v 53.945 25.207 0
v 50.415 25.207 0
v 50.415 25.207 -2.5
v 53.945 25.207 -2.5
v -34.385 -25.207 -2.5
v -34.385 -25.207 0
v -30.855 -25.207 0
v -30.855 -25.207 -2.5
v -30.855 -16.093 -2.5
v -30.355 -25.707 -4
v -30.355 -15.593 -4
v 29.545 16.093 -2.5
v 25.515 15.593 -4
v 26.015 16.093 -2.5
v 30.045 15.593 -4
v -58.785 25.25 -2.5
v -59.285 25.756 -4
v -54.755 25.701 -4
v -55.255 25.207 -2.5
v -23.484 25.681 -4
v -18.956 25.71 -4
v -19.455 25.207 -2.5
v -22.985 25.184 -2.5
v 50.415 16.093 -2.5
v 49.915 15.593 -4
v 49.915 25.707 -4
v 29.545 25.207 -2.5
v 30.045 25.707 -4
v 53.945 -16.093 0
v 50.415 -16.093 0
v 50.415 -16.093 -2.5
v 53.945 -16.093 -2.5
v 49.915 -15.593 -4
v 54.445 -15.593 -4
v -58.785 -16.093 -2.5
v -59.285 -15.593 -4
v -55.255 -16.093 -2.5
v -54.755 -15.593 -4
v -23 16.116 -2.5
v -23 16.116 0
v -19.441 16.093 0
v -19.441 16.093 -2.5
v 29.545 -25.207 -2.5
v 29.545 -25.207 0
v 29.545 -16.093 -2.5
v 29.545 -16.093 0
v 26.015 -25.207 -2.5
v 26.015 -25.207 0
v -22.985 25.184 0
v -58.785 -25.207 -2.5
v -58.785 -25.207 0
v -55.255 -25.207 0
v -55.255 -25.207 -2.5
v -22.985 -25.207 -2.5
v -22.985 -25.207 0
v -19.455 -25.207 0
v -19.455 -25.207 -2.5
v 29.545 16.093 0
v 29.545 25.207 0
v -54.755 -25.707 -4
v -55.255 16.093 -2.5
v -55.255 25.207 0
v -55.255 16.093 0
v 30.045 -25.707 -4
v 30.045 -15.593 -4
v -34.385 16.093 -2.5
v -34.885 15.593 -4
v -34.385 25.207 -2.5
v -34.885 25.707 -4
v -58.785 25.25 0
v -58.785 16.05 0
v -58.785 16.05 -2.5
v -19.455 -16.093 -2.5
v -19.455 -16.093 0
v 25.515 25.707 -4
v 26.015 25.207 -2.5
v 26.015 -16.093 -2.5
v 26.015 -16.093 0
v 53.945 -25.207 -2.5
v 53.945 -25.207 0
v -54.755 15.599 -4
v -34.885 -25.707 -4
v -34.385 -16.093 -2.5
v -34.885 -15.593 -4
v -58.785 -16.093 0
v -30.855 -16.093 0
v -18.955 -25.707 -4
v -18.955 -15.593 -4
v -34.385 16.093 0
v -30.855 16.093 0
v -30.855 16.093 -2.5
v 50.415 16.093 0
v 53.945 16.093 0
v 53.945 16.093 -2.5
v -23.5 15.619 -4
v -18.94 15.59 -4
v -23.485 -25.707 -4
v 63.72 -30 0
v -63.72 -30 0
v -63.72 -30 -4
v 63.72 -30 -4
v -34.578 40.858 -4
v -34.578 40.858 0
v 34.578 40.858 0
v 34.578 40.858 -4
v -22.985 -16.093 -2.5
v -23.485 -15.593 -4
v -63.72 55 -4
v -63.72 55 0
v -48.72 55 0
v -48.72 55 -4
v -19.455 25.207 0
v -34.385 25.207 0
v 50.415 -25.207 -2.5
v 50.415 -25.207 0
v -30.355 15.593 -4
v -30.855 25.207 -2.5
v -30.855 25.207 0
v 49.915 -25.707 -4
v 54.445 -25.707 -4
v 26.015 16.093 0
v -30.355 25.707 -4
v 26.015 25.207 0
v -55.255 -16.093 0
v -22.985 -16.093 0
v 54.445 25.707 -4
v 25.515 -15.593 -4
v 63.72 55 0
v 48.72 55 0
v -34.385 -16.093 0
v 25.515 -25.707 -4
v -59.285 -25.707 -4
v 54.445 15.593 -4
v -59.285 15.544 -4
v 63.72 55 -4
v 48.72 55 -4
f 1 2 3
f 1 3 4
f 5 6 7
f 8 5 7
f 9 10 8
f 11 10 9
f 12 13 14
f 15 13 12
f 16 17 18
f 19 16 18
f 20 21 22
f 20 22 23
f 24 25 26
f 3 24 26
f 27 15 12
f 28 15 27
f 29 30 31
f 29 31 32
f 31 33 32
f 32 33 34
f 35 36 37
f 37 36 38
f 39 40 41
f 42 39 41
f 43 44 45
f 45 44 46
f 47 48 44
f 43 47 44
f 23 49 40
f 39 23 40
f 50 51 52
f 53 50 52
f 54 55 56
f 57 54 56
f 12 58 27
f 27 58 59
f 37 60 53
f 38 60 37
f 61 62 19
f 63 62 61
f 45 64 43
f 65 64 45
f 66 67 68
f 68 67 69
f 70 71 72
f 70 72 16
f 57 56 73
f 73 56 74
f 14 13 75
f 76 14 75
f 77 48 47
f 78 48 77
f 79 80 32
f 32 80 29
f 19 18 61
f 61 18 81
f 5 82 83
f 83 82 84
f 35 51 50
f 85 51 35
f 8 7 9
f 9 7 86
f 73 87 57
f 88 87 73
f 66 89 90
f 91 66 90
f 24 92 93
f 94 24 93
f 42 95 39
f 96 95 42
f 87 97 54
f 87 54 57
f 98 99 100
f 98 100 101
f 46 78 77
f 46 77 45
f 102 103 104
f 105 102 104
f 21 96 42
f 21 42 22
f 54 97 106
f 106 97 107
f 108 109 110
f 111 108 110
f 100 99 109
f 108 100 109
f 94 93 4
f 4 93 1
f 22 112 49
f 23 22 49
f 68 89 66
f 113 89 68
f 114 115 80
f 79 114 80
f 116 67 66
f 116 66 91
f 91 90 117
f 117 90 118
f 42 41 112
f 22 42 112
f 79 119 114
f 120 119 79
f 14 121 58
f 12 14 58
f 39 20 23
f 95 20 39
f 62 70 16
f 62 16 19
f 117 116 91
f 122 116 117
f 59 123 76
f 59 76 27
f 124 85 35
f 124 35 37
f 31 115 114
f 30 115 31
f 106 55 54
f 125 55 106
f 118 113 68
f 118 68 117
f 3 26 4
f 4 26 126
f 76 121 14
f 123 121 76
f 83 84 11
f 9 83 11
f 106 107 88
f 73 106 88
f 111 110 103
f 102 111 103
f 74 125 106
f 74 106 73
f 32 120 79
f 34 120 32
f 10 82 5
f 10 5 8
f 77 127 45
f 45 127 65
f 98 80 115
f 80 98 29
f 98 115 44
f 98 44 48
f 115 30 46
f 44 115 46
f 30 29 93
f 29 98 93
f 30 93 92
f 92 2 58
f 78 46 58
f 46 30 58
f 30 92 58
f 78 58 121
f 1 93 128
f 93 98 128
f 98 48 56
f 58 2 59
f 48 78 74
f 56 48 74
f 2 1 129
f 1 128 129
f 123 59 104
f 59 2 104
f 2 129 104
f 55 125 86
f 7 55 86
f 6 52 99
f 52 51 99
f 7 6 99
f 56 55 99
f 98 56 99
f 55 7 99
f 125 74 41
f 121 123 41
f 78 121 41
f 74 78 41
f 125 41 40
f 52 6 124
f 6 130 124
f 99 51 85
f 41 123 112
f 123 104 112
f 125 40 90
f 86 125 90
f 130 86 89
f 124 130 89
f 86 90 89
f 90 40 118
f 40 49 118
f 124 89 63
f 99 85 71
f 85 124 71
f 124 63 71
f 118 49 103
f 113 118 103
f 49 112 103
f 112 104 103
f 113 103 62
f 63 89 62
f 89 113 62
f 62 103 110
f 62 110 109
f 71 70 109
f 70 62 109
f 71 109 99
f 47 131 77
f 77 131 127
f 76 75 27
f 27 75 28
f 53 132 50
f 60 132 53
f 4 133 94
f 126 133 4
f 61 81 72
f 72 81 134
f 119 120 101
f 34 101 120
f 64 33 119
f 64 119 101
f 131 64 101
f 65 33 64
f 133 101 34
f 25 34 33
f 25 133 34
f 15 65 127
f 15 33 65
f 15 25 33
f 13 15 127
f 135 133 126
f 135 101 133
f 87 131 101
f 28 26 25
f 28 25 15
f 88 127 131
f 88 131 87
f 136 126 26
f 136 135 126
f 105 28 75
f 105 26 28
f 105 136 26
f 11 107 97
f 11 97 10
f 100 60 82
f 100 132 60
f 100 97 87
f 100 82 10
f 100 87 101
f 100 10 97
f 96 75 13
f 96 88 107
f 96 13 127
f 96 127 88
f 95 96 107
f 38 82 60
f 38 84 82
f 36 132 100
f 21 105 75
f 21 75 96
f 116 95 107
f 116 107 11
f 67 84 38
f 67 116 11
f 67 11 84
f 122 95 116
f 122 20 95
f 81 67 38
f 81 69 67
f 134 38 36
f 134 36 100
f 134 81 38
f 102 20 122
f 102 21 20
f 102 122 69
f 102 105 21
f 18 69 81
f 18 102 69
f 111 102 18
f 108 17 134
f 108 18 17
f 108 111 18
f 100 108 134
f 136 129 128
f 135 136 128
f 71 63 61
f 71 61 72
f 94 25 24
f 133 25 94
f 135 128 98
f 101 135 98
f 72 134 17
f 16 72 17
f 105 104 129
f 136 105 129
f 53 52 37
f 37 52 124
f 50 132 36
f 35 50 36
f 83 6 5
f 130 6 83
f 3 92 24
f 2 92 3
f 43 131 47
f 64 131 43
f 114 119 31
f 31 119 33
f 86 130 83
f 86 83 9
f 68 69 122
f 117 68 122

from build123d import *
from OCP.BRepFilletAPI import BRepFilletAPI_MakeChamfer

# Parameters (mm, degrees)
SKETCH1_W           = 127.440194606
SKETCH1_H           = 60
SKETCH1_W_2         = 3.53
SKETCH1_H_2         = 9.11399265
BOSS_EXTRUDE1_DEPTH = 4
BOSS_EXTRUDE2_DEPTH = 4
CHAMFER1_SIZE       = 1.5
CHAMFER1_SIZE2      = 0.5


with BuildPart() as part:
    # Sketch1 → Boss-Extrude1 (new body)
    with BuildSketch(Plane.XY):
        Rectangle(SKETCH1_W, SKETCH1_H)
        with Locations((-32.620097303, 20.65)):
            Rectangle(SKETCH1_W_2, SKETCH1_H_2, mode=Mode.SUBTRACT)
        with Locations((27.7799027, 20.65)):
            Rectangle(SKETCH1_W_2, SKETCH1_H_2, mode=Mode.SUBTRACT)
        with Locations((27.7799027, -20.65)):
            Rectangle(SKETCH1_W_2, SKETCH1_H_2, mode=Mode.SUBTRACT)
        Polygon((-19.455133439, 25.206990566), (-22.985061166, 25.184401952), (-22.999551776, 16.115598048), (-19.440642829, 16.093009434), align=None, mode=Mode.SUBTRACT)
        with Locations((-21.220097303, -20.65)):
            Rectangle(SKETCH1_W_2, SKETCH1_H_2, mode=Mode.SUBTRACT)
        with Locations((52.1799027, 20.65)):
            Rectangle(SKETCH1_W_2, SKETCH1_H_2, mode=Mode.SUBTRACT)
        with Locations((52.1799027, -20.65)):
            Rectangle(SKETCH1_W_2, SKETCH1_H_2, mode=Mode.SUBTRACT)
        with Locations((-32.620097303, -20.65)):
            Rectangle(SKETCH1_W_2, SKETCH1_H_2, mode=Mode.SUBTRACT)
        Polygon((-58.784966326, 25.25), (-55.255228279, 25.206996325), (-55.255228279, 16.093003675), (-58.784966326, 16.05), align=None, mode=Mode.SUBTRACT)
        with Locations((-57.020097303, -20.65)):
            Rectangle(SKETCH1_W_2, SKETCH1_H_2, mode=Mode.SUBTRACT)
    extrude(amount=-BOSS_EXTRUDE1_DEPTH)

    # Sketch2 → Boss-Extrude2 (add)
    with BuildSketch(Plane.XY):
        Polygon((-63.720097303, 30), (-63.720097303, 55), (-48.720097303, 55), (-34.577961679, 40.857864376), (34.577961679, 40.857864376), (48.720097303, 55), (63.720097303, 55), (63.720097303, 30), align=None)
    extrude(amount=-BOSS_EXTRUDE2_DEPTH)

    # Chamfer1: one chamfer whose edges measure the first distance from different faces: ONE call of the kernel's chamfer builder (chamfer() names one face for all edges)
    chamfer1_edges_1 = [part.edges().sort_by_distance(p)[0] for p in [
        (50.4149027, -20.65, -4),
    ]]
    chamfer1_side_1 = [part.faces().sort_by_distance(p)[0] for p in [
        (50.4149027, -20.65, -2),
    ]]
    chamfer1_edges_2 = [part.edges().sort_by_distance(p)[0] for p in [
        (52.1799027, -16.093003675, -4),
    ]]
    chamfer1_side_2 = [part.faces().sort_by_distance(p)[0] for p in [
        (52.1799027, -16.093003675, -2),
    ]]
    chamfer1_edges_3 = [part.edges().sort_by_distance(p)[0] for p in [
        (53.9449027, -20.65, -4),
    ]]
    chamfer1_side_3 = [part.faces().sort_by_distance(p)[0] for p in [
        (53.9449027, -20.65, -2),
    ]]
    chamfer1_edges_4 = [part.edges().sort_by_distance(p)[0] for p in [
        (52.1799027, -25.206996325, -4),
    ]]
    chamfer1_side_4 = [part.faces().sort_by_distance(p)[0] for p in [
        (52.1799027, -25.206996325, -2),
    ]]
    chamfer1_edges_5 = [part.edges().sort_by_distance(p)[0] for p in [
        (-58.784966326, 20.65, -4),
    ]]
    chamfer1_side_5 = [part.faces().sort_by_distance(p)[0] for p in [
        (-58.784966326, 20.65, -2),
    ]]
    chamfer1_edges_6 = [part.edges().sort_by_distance(p)[0] for p in [
        (-57.020097303, 25.228498163, -4),
    ]]
    chamfer1_side_6 = [part.faces().sort_by_distance(p)[0] for p in [
        (-57.020097303, 25.228498163, -2),
    ]]
    chamfer1_edges_7 = [part.edges().sort_by_distance(p)[0] for p in [
        (-55.255228279, 20.65, -4),
    ]]
    chamfer1_side_7 = [part.faces().sort_by_distance(p)[0] for p in [
        (-55.255228279, 20.65, -2),
    ]]
    chamfer1_edges_8 = [part.edges().sort_by_distance(p)[0] for p in [
        (-57.020097303, 16.071501837, -4),
    ]]
    chamfer1_side_8 = [part.faces().sort_by_distance(p)[0] for p in [
        (-57.020097303, 16.071501837, -2),
    ]]
    chamfer1_edges_9 = [part.edges().sort_by_distance(p)[0] for p in [
        (-58.785097303, -20.65, -4),
    ]]
    chamfer1_side_9 = [part.faces().sort_by_distance(p)[0] for p in [
        (-58.785097303, -20.65, -2),
    ]]
    chamfer1_edges_10 = [part.edges().sort_by_distance(p)[0] for p in [
        (-57.020097303, -16.093003675, -4),
    ]]
    chamfer1_side_10 = [part.faces().sort_by_distance(p)[0] for p in [
        (-57.020097303, -16.093003675, -2),
    ]]
    chamfer1_edges_11 = [part.edges().sort_by_distance(p)[0] for p in [
        (-55.255097303, -20.65, -4),
    ]]
    chamfer1_side_11 = [part.faces().sort_by_distance(p)[0] for p in [
        (-55.255097303, -20.65, -2),
    ]]
    chamfer1_edges_12 = [part.edges().sort_by_distance(p)[0] for p in [
        (-57.020097303, -25.206996325, -4),
    ]]
    chamfer1_side_12 = [part.faces().sort_by_distance(p)[0] for p in [
        (-57.020097303, -25.206996325, -2),
    ]]
    chamfer1_edges_13 = [part.edges().sort_by_distance(p)[0] for p in [
        (26.0149027, 20.65, -4),
    ]]
    chamfer1_side_13 = [part.faces().sort_by_distance(p)[0] for p in [
        (26.0149027, 20.65, -2),
    ]]
    chamfer1_edges_14 = [part.edges().sort_by_distance(p)[0] for p in [
        (27.7799027, 25.206996325, -4),
    ]]
    chamfer1_side_14 = [part.faces().sort_by_distance(p)[0] for p in [
        (27.7799027, 25.206996325, -2),
    ]]
    chamfer1_edges_15 = [part.edges().sort_by_distance(p)[0] for p in [
        (29.5449027, 20.65, -4),
    ]]
    chamfer1_side_15 = [part.faces().sort_by_distance(p)[0] for p in [
        (29.5449027, 20.65, -2),
    ]]
    chamfer1_edges_16 = [part.edges().sort_by_distance(p)[0] for p in [
        (27.7799027, 16.093003675, -4),
    ]]
    chamfer1_side_16 = [part.faces().sort_by_distance(p)[0] for p in [
        (27.7799027, 16.093003675, -2),
    ]]
    chamfer1_edges_17 = [part.edges().sort_by_distance(p)[0] for p in [
        (26.0149027, -20.65, -4),
    ]]
    chamfer1_side_17 = [part.faces().sort_by_distance(p)[0] for p in [
        (26.0149027, -20.65, -2),
    ]]
    chamfer1_edges_18 = [part.edges().sort_by_distance(p)[0] for p in [
        (27.7799027, -16.093003675, -4),
    ]]
    chamfer1_side_18 = [part.faces().sort_by_distance(p)[0] for p in [
        (27.7799027, -16.093003675, -2),
    ]]
    chamfer1_edges_19 = [part.edges().sort_by_distance(p)[0] for p in [
        (29.5449027, -20.65, -4),
    ]]
    chamfer1_side_19 = [part.faces().sort_by_distance(p)[0] for p in [
        (29.5449027, -20.65, -2),
    ]]
    chamfer1_edges_20 = [part.edges().sort_by_distance(p)[0] for p in [
        (27.7799027, -25.206996325, -4),
    ]]
    chamfer1_side_20 = [part.faces().sort_by_distance(p)[0] for p in [
        (27.7799027, -25.206996325, -2),
    ]]
    chamfer1_edges_21 = [part.edges().sort_by_distance(p)[0] for p in [
        (-19.447888134, 20.65, -4),
    ]]
    chamfer1_side_21 = [part.faces().sort_by_distance(p)[0] for p in [
        (-19.447888134, 20.65, -2),
    ]]
    chamfer1_edges_22 = [part.edges().sort_by_distance(p)[0] for p in [
        (-21.220097303, 16.104303741, -4),
    ]]
    chamfer1_side_22 = [part.faces().sort_by_distance(p)[0] for p in [
        (-21.220097303, 16.104303741, -2),
    ]]
    chamfer1_edges_23 = [part.edges().sort_by_distance(p)[0] for p in [
        (-22.992306471, 20.65, -4),
    ]]
    chamfer1_side_23 = [part.faces().sort_by_distance(p)[0] for p in [
        (-22.992306471, 20.65, -2),
    ]]
    chamfer1_edges_24 = [part.edges().sort_by_distance(p)[0] for p in [
        (-21.220097303, 25.195696259, -4),
    ]]
    chamfer1_side_24 = [part.faces().sort_by_distance(p)[0] for p in [
        (-21.220097303, 25.195696259, -2),
    ]]
    chamfer1_edges_25 = [part.edges().sort_by_distance(p)[0] for p in [
        (-19.455097303, -20.65, -4),
    ]]
    chamfer1_side_25 = [part.faces().sort_by_distance(p)[0] for p in [
        (-19.455097303, -20.65, -2),
    ]]
    chamfer1_edges_26 = [part.edges().sort_by_distance(p)[0] for p in [
        (-21.220097303, -25.206996325, -4),
    ]]
    chamfer1_side_26 = [part.faces().sort_by_distance(p)[0] for p in [
        (-21.220097303, -25.206996325, -2),
    ]]
    chamfer1_edges_27 = [part.edges().sort_by_distance(p)[0] for p in [
        (-22.985097303, -20.65, -4),
    ]]
    chamfer1_side_27 = [part.faces().sort_by_distance(p)[0] for p in [
        (-22.985097303, -20.65, -2),
    ]]
    chamfer1_edges_28 = [part.edges().sort_by_distance(p)[0] for p in [
        (-21.220097303, -16.093003675, -4),
    ]]
    chamfer1_side_28 = [part.faces().sort_by_distance(p)[0] for p in [
        (-21.220097303, -16.093003675, -2),
    ]]
    chamfer1_edges_29 = [part.edges().sort_by_distance(p)[0] for p in [
        (-34.385097303, 20.65, -4),
    ]]
    chamfer1_side_29 = [part.faces().sort_by_distance(p)[0] for p in [
        (-34.385097303, 20.65, -2),
    ]]
    chamfer1_edges_30 = [part.edges().sort_by_distance(p)[0] for p in [
        (-32.620097303, 25.206996325, -4),
    ]]
    chamfer1_side_30 = [part.faces().sort_by_distance(p)[0] for p in [
        (-32.620097303, 25.206996325, -2),
    ]]
    chamfer1_edges_31 = [part.edges().sort_by_distance(p)[0] for p in [
        (-30.855097303, 20.65, -4),
    ]]
    chamfer1_side_31 = [part.faces().sort_by_distance(p)[0] for p in [
        (-30.855097303, 20.65, -2),
    ]]
    chamfer1_edges_32 = [part.edges().sort_by_distance(p)[0] for p in [
        (-32.620097303, 16.093003675, -4),
    ]]
    chamfer1_side_32 = [part.faces().sort_by_distance(p)[0] for p in [
        (-32.620097303, 16.093003675, -2),
    ]]
    chamfer1_edges_33 = [part.edges().sort_by_distance(p)[0] for p in [
        (-34.385097303, -20.65, -4),
    ]]
    chamfer1_side_33 = [part.faces().sort_by_distance(p)[0] for p in [
        (-34.385097303, -20.65, -2),
    ]]
    chamfer1_edges_34 = [part.edges().sort_by_distance(p)[0] for p in [
        (-32.620097303, -16.093003675, -4),
    ]]
    chamfer1_side_34 = [part.faces().sort_by_distance(p)[0] for p in [
        (-32.620097303, -16.093003675, -2),
    ]]
    chamfer1_edges_35 = [part.edges().sort_by_distance(p)[0] for p in [
        (-30.855097303, -20.65, -4),
    ]]
    chamfer1_side_35 = [part.faces().sort_by_distance(p)[0] for p in [
        (-30.855097303, -20.65, -2),
    ]]
    chamfer1_edges_36 = [part.edges().sort_by_distance(p)[0] for p in [
        (-32.620097303, -25.206996325, -4),
    ]]
    chamfer1_side_36 = [part.faces().sort_by_distance(p)[0] for p in [
        (-32.620097303, -25.206996325, -2),
    ]]
    chamfer1_edges_37 = [part.edges().sort_by_distance(p)[0] for p in [
        (50.4149027, 20.65, -4),
    ]]
    chamfer1_side_37 = [part.faces().sort_by_distance(p)[0] for p in [
        (50.4149027, 20.65, -2),
    ]]
    chamfer1_edges_38 = [part.edges().sort_by_distance(p)[0] for p in [
        (52.1799027, 25.206996325, -4),
    ]]
    chamfer1_side_38 = [part.faces().sort_by_distance(p)[0] for p in [
        (52.1799027, 25.206996325, -2),
    ]]
    chamfer1_edges_39 = [part.edges().sort_by_distance(p)[0] for p in [
        (53.9449027, 20.65, -4),
    ]]
    chamfer1_side_39 = [part.faces().sort_by_distance(p)[0] for p in [
        (53.9449027, 20.65, -2),
    ]]
    chamfer1_edges_40 = [part.edges().sort_by_distance(p)[0] for p in [
        (52.1799027, 16.093003675, -4),
    ]]
    chamfer1_side_40 = [part.faces().sort_by_distance(p)[0] for p in [
        (52.1799027, 16.093003675, -2),
    ]]
    chamfer1 = BRepFilletAPI_MakeChamfer(part.part.solid().wrapped)
    for e in chamfer1_edges_1:
        chamfer1.Add(CHAMFER1_SIZE, CHAMFER1_SIZE2, e.wrapped, chamfer1_side_1[0].wrapped)  # the first distance lies on this face
    for e in chamfer1_edges_2:
        chamfer1.Add(CHAMFER1_SIZE, CHAMFER1_SIZE2, e.wrapped, chamfer1_side_2[0].wrapped)  # the first distance lies on this face
    for e in chamfer1_edges_3:
        chamfer1.Add(CHAMFER1_SIZE, CHAMFER1_SIZE2, e.wrapped, chamfer1_side_3[0].wrapped)  # the first distance lies on this face
    for e in chamfer1_edges_4:
        chamfer1.Add(CHAMFER1_SIZE, CHAMFER1_SIZE2, e.wrapped, chamfer1_side_4[0].wrapped)  # the first distance lies on this face
    for e in chamfer1_edges_5:
        chamfer1.Add(CHAMFER1_SIZE, CHAMFER1_SIZE2, e.wrapped, chamfer1_side_5[0].wrapped)  # the first distance lies on this face
    for e in chamfer1_edges_6:
        chamfer1.Add(CHAMFER1_SIZE, CHAMFER1_SIZE2, e.wrapped, chamfer1_side_6[0].wrapped)  # the first distance lies on this face
    for e in chamfer1_edges_7:
        chamfer1.Add(CHAMFER1_SIZE, CHAMFER1_SIZE2, e.wrapped, chamfer1_side_7[0].wrapped)  # the first distance lies on this face
    for e in chamfer1_edges_8:
        chamfer1.Add(CHAMFER1_SIZE, CHAMFER1_SIZE2, e.wrapped, chamfer1_side_8[0].wrapped)  # the first distance lies on this face
    for e in chamfer1_edges_9:
        chamfer1.Add(CHAMFER1_SIZE, CHAMFER1_SIZE2, e.wrapped, chamfer1_side_9[0].wrapped)  # the first distance lies on this face
    for e in chamfer1_edges_10:
        chamfer1.Add(CHAMFER1_SIZE, CHAMFER1_SIZE2, e.wrapped, chamfer1_side_10[0].wrapped)  # the first distance lies on this face
    for e in chamfer1_edges_11:
        chamfer1.Add(CHAMFER1_SIZE, CHAMFER1_SIZE2, e.wrapped, chamfer1_side_11[0].wrapped)  # the first distance lies on this face
    for e in chamfer1_edges_12:
        chamfer1.Add(CHAMFER1_SIZE, CHAMFER1_SIZE2, e.wrapped, chamfer1_side_12[0].wrapped)  # the first distance lies on this face
    for e in chamfer1_edges_13:
        chamfer1.Add(CHAMFER1_SIZE, CHAMFER1_SIZE2, e.wrapped, chamfer1_side_13[0].wrapped)  # the first distance lies on this face
    for e in chamfer1_edges_14:
        chamfer1.Add(CHAMFER1_SIZE, CHAMFER1_SIZE2, e.wrapped, chamfer1_side_14[0].wrapped)  # the first distance lies on this face
    for e in chamfer1_edges_15:
        chamfer1.Add(CHAMFER1_SIZE, CHAMFER1_SIZE2, e.wrapped, chamfer1_side_15[0].wrapped)  # the first distance lies on this face
    for e in chamfer1_edges_16:
        chamfer1.Add(CHAMFER1_SIZE, CHAMFER1_SIZE2, e.wrapped, chamfer1_side_16[0].wrapped)  # the first distance lies on this face
    for e in chamfer1_edges_17:
        chamfer1.Add(CHAMFER1_SIZE, CHAMFER1_SIZE2, e.wrapped, chamfer1_side_17[0].wrapped)  # the first distance lies on this face
    for e in chamfer1_edges_18:
        chamfer1.Add(CHAMFER1_SIZE, CHAMFER1_SIZE2, e.wrapped, chamfer1_side_18[0].wrapped)  # the first distance lies on this face
    for e in chamfer1_edges_19:
        chamfer1.Add(CHAMFER1_SIZE, CHAMFER1_SIZE2, e.wrapped, chamfer1_side_19[0].wrapped)  # the first distance lies on this face
    for e in chamfer1_edges_20:
        chamfer1.Add(CHAMFER1_SIZE, CHAMFER1_SIZE2, e.wrapped, chamfer1_side_20[0].wrapped)  # the first distance lies on this face
    for e in chamfer1_edges_21:
        chamfer1.Add(CHAMFER1_SIZE, CHAMFER1_SIZE2, e.wrapped, chamfer1_side_21[0].wrapped)  # the first distance lies on this face
    for e in chamfer1_edges_22:
        chamfer1.Add(CHAMFER1_SIZE, CHAMFER1_SIZE2, e.wrapped, chamfer1_side_22[0].wrapped)  # the first distance lies on this face
    for e in chamfer1_edges_23:
        chamfer1.Add(CHAMFER1_SIZE, CHAMFER1_SIZE2, e.wrapped, chamfer1_side_23[0].wrapped)  # the first distance lies on this face
    for e in chamfer1_edges_24:
        chamfer1.Add(CHAMFER1_SIZE, CHAMFER1_SIZE2, e.wrapped, chamfer1_side_24[0].wrapped)  # the first distance lies on this face
    for e in chamfer1_edges_25:
        chamfer1.Add(CHAMFER1_SIZE, CHAMFER1_SIZE2, e.wrapped, chamfer1_side_25[0].wrapped)  # the first distance lies on this face
    for e in chamfer1_edges_26:
        chamfer1.Add(CHAMFER1_SIZE, CHAMFER1_SIZE2, e.wrapped, chamfer1_side_26[0].wrapped)  # the first distance lies on this face
    for e in chamfer1_edges_27:
        chamfer1.Add(CHAMFER1_SIZE, CHAMFER1_SIZE2, e.wrapped, chamfer1_side_27[0].wrapped)  # the first distance lies on this face
    for e in chamfer1_edges_28:
        chamfer1.Add(CHAMFER1_SIZE, CHAMFER1_SIZE2, e.wrapped, chamfer1_side_28[0].wrapped)  # the first distance lies on this face
    for e in chamfer1_edges_29:
        chamfer1.Add(CHAMFER1_SIZE, CHAMFER1_SIZE2, e.wrapped, chamfer1_side_29[0].wrapped)  # the first distance lies on this face
    for e in chamfer1_edges_30:
        chamfer1.Add(CHAMFER1_SIZE, CHAMFER1_SIZE2, e.wrapped, chamfer1_side_30[0].wrapped)  # the first distance lies on this face
    for e in chamfer1_edges_31:
        chamfer1.Add(CHAMFER1_SIZE, CHAMFER1_SIZE2, e.wrapped, chamfer1_side_31[0].wrapped)  # the first distance lies on this face
    for e in chamfer1_edges_32:
        chamfer1.Add(CHAMFER1_SIZE, CHAMFER1_SIZE2, e.wrapped, chamfer1_side_32[0].wrapped)  # the first distance lies on this face
    for e in chamfer1_edges_33:
        chamfer1.Add(CHAMFER1_SIZE, CHAMFER1_SIZE2, e.wrapped, chamfer1_side_33[0].wrapped)  # the first distance lies on this face
    for e in chamfer1_edges_34:
        chamfer1.Add(CHAMFER1_SIZE, CHAMFER1_SIZE2, e.wrapped, chamfer1_side_34[0].wrapped)  # the first distance lies on this face
    for e in chamfer1_edges_35:
        chamfer1.Add(CHAMFER1_SIZE, CHAMFER1_SIZE2, e.wrapped, chamfer1_side_35[0].wrapped)  # the first distance lies on this face
    for e in chamfer1_edges_36:
        chamfer1.Add(CHAMFER1_SIZE, CHAMFER1_SIZE2, e.wrapped, chamfer1_side_36[0].wrapped)  # the first distance lies on this face
    for e in chamfer1_edges_37:
        chamfer1.Add(CHAMFER1_SIZE, CHAMFER1_SIZE2, e.wrapped, chamfer1_side_37[0].wrapped)  # the first distance lies on this face
    for e in chamfer1_edges_38:
        chamfer1.Add(CHAMFER1_SIZE, CHAMFER1_SIZE2, e.wrapped, chamfer1_side_38[0].wrapped)  # the first distance lies on this face
    for e in chamfer1_edges_39:
        chamfer1.Add(CHAMFER1_SIZE, CHAMFER1_SIZE2, e.wrapped, chamfer1_side_39[0].wrapped)  # the first distance lies on this face
    for e in chamfer1_edges_40:
        chamfer1.Add(CHAMFER1_SIZE, CHAMFER1_SIZE2, e.wrapped, chamfer1_side_40[0].wrapped)  # the first distance lies on this face
    add(Compound.cast(chamfer1.Shape()), mode=Mode.REPLACE)


solid = part.part
